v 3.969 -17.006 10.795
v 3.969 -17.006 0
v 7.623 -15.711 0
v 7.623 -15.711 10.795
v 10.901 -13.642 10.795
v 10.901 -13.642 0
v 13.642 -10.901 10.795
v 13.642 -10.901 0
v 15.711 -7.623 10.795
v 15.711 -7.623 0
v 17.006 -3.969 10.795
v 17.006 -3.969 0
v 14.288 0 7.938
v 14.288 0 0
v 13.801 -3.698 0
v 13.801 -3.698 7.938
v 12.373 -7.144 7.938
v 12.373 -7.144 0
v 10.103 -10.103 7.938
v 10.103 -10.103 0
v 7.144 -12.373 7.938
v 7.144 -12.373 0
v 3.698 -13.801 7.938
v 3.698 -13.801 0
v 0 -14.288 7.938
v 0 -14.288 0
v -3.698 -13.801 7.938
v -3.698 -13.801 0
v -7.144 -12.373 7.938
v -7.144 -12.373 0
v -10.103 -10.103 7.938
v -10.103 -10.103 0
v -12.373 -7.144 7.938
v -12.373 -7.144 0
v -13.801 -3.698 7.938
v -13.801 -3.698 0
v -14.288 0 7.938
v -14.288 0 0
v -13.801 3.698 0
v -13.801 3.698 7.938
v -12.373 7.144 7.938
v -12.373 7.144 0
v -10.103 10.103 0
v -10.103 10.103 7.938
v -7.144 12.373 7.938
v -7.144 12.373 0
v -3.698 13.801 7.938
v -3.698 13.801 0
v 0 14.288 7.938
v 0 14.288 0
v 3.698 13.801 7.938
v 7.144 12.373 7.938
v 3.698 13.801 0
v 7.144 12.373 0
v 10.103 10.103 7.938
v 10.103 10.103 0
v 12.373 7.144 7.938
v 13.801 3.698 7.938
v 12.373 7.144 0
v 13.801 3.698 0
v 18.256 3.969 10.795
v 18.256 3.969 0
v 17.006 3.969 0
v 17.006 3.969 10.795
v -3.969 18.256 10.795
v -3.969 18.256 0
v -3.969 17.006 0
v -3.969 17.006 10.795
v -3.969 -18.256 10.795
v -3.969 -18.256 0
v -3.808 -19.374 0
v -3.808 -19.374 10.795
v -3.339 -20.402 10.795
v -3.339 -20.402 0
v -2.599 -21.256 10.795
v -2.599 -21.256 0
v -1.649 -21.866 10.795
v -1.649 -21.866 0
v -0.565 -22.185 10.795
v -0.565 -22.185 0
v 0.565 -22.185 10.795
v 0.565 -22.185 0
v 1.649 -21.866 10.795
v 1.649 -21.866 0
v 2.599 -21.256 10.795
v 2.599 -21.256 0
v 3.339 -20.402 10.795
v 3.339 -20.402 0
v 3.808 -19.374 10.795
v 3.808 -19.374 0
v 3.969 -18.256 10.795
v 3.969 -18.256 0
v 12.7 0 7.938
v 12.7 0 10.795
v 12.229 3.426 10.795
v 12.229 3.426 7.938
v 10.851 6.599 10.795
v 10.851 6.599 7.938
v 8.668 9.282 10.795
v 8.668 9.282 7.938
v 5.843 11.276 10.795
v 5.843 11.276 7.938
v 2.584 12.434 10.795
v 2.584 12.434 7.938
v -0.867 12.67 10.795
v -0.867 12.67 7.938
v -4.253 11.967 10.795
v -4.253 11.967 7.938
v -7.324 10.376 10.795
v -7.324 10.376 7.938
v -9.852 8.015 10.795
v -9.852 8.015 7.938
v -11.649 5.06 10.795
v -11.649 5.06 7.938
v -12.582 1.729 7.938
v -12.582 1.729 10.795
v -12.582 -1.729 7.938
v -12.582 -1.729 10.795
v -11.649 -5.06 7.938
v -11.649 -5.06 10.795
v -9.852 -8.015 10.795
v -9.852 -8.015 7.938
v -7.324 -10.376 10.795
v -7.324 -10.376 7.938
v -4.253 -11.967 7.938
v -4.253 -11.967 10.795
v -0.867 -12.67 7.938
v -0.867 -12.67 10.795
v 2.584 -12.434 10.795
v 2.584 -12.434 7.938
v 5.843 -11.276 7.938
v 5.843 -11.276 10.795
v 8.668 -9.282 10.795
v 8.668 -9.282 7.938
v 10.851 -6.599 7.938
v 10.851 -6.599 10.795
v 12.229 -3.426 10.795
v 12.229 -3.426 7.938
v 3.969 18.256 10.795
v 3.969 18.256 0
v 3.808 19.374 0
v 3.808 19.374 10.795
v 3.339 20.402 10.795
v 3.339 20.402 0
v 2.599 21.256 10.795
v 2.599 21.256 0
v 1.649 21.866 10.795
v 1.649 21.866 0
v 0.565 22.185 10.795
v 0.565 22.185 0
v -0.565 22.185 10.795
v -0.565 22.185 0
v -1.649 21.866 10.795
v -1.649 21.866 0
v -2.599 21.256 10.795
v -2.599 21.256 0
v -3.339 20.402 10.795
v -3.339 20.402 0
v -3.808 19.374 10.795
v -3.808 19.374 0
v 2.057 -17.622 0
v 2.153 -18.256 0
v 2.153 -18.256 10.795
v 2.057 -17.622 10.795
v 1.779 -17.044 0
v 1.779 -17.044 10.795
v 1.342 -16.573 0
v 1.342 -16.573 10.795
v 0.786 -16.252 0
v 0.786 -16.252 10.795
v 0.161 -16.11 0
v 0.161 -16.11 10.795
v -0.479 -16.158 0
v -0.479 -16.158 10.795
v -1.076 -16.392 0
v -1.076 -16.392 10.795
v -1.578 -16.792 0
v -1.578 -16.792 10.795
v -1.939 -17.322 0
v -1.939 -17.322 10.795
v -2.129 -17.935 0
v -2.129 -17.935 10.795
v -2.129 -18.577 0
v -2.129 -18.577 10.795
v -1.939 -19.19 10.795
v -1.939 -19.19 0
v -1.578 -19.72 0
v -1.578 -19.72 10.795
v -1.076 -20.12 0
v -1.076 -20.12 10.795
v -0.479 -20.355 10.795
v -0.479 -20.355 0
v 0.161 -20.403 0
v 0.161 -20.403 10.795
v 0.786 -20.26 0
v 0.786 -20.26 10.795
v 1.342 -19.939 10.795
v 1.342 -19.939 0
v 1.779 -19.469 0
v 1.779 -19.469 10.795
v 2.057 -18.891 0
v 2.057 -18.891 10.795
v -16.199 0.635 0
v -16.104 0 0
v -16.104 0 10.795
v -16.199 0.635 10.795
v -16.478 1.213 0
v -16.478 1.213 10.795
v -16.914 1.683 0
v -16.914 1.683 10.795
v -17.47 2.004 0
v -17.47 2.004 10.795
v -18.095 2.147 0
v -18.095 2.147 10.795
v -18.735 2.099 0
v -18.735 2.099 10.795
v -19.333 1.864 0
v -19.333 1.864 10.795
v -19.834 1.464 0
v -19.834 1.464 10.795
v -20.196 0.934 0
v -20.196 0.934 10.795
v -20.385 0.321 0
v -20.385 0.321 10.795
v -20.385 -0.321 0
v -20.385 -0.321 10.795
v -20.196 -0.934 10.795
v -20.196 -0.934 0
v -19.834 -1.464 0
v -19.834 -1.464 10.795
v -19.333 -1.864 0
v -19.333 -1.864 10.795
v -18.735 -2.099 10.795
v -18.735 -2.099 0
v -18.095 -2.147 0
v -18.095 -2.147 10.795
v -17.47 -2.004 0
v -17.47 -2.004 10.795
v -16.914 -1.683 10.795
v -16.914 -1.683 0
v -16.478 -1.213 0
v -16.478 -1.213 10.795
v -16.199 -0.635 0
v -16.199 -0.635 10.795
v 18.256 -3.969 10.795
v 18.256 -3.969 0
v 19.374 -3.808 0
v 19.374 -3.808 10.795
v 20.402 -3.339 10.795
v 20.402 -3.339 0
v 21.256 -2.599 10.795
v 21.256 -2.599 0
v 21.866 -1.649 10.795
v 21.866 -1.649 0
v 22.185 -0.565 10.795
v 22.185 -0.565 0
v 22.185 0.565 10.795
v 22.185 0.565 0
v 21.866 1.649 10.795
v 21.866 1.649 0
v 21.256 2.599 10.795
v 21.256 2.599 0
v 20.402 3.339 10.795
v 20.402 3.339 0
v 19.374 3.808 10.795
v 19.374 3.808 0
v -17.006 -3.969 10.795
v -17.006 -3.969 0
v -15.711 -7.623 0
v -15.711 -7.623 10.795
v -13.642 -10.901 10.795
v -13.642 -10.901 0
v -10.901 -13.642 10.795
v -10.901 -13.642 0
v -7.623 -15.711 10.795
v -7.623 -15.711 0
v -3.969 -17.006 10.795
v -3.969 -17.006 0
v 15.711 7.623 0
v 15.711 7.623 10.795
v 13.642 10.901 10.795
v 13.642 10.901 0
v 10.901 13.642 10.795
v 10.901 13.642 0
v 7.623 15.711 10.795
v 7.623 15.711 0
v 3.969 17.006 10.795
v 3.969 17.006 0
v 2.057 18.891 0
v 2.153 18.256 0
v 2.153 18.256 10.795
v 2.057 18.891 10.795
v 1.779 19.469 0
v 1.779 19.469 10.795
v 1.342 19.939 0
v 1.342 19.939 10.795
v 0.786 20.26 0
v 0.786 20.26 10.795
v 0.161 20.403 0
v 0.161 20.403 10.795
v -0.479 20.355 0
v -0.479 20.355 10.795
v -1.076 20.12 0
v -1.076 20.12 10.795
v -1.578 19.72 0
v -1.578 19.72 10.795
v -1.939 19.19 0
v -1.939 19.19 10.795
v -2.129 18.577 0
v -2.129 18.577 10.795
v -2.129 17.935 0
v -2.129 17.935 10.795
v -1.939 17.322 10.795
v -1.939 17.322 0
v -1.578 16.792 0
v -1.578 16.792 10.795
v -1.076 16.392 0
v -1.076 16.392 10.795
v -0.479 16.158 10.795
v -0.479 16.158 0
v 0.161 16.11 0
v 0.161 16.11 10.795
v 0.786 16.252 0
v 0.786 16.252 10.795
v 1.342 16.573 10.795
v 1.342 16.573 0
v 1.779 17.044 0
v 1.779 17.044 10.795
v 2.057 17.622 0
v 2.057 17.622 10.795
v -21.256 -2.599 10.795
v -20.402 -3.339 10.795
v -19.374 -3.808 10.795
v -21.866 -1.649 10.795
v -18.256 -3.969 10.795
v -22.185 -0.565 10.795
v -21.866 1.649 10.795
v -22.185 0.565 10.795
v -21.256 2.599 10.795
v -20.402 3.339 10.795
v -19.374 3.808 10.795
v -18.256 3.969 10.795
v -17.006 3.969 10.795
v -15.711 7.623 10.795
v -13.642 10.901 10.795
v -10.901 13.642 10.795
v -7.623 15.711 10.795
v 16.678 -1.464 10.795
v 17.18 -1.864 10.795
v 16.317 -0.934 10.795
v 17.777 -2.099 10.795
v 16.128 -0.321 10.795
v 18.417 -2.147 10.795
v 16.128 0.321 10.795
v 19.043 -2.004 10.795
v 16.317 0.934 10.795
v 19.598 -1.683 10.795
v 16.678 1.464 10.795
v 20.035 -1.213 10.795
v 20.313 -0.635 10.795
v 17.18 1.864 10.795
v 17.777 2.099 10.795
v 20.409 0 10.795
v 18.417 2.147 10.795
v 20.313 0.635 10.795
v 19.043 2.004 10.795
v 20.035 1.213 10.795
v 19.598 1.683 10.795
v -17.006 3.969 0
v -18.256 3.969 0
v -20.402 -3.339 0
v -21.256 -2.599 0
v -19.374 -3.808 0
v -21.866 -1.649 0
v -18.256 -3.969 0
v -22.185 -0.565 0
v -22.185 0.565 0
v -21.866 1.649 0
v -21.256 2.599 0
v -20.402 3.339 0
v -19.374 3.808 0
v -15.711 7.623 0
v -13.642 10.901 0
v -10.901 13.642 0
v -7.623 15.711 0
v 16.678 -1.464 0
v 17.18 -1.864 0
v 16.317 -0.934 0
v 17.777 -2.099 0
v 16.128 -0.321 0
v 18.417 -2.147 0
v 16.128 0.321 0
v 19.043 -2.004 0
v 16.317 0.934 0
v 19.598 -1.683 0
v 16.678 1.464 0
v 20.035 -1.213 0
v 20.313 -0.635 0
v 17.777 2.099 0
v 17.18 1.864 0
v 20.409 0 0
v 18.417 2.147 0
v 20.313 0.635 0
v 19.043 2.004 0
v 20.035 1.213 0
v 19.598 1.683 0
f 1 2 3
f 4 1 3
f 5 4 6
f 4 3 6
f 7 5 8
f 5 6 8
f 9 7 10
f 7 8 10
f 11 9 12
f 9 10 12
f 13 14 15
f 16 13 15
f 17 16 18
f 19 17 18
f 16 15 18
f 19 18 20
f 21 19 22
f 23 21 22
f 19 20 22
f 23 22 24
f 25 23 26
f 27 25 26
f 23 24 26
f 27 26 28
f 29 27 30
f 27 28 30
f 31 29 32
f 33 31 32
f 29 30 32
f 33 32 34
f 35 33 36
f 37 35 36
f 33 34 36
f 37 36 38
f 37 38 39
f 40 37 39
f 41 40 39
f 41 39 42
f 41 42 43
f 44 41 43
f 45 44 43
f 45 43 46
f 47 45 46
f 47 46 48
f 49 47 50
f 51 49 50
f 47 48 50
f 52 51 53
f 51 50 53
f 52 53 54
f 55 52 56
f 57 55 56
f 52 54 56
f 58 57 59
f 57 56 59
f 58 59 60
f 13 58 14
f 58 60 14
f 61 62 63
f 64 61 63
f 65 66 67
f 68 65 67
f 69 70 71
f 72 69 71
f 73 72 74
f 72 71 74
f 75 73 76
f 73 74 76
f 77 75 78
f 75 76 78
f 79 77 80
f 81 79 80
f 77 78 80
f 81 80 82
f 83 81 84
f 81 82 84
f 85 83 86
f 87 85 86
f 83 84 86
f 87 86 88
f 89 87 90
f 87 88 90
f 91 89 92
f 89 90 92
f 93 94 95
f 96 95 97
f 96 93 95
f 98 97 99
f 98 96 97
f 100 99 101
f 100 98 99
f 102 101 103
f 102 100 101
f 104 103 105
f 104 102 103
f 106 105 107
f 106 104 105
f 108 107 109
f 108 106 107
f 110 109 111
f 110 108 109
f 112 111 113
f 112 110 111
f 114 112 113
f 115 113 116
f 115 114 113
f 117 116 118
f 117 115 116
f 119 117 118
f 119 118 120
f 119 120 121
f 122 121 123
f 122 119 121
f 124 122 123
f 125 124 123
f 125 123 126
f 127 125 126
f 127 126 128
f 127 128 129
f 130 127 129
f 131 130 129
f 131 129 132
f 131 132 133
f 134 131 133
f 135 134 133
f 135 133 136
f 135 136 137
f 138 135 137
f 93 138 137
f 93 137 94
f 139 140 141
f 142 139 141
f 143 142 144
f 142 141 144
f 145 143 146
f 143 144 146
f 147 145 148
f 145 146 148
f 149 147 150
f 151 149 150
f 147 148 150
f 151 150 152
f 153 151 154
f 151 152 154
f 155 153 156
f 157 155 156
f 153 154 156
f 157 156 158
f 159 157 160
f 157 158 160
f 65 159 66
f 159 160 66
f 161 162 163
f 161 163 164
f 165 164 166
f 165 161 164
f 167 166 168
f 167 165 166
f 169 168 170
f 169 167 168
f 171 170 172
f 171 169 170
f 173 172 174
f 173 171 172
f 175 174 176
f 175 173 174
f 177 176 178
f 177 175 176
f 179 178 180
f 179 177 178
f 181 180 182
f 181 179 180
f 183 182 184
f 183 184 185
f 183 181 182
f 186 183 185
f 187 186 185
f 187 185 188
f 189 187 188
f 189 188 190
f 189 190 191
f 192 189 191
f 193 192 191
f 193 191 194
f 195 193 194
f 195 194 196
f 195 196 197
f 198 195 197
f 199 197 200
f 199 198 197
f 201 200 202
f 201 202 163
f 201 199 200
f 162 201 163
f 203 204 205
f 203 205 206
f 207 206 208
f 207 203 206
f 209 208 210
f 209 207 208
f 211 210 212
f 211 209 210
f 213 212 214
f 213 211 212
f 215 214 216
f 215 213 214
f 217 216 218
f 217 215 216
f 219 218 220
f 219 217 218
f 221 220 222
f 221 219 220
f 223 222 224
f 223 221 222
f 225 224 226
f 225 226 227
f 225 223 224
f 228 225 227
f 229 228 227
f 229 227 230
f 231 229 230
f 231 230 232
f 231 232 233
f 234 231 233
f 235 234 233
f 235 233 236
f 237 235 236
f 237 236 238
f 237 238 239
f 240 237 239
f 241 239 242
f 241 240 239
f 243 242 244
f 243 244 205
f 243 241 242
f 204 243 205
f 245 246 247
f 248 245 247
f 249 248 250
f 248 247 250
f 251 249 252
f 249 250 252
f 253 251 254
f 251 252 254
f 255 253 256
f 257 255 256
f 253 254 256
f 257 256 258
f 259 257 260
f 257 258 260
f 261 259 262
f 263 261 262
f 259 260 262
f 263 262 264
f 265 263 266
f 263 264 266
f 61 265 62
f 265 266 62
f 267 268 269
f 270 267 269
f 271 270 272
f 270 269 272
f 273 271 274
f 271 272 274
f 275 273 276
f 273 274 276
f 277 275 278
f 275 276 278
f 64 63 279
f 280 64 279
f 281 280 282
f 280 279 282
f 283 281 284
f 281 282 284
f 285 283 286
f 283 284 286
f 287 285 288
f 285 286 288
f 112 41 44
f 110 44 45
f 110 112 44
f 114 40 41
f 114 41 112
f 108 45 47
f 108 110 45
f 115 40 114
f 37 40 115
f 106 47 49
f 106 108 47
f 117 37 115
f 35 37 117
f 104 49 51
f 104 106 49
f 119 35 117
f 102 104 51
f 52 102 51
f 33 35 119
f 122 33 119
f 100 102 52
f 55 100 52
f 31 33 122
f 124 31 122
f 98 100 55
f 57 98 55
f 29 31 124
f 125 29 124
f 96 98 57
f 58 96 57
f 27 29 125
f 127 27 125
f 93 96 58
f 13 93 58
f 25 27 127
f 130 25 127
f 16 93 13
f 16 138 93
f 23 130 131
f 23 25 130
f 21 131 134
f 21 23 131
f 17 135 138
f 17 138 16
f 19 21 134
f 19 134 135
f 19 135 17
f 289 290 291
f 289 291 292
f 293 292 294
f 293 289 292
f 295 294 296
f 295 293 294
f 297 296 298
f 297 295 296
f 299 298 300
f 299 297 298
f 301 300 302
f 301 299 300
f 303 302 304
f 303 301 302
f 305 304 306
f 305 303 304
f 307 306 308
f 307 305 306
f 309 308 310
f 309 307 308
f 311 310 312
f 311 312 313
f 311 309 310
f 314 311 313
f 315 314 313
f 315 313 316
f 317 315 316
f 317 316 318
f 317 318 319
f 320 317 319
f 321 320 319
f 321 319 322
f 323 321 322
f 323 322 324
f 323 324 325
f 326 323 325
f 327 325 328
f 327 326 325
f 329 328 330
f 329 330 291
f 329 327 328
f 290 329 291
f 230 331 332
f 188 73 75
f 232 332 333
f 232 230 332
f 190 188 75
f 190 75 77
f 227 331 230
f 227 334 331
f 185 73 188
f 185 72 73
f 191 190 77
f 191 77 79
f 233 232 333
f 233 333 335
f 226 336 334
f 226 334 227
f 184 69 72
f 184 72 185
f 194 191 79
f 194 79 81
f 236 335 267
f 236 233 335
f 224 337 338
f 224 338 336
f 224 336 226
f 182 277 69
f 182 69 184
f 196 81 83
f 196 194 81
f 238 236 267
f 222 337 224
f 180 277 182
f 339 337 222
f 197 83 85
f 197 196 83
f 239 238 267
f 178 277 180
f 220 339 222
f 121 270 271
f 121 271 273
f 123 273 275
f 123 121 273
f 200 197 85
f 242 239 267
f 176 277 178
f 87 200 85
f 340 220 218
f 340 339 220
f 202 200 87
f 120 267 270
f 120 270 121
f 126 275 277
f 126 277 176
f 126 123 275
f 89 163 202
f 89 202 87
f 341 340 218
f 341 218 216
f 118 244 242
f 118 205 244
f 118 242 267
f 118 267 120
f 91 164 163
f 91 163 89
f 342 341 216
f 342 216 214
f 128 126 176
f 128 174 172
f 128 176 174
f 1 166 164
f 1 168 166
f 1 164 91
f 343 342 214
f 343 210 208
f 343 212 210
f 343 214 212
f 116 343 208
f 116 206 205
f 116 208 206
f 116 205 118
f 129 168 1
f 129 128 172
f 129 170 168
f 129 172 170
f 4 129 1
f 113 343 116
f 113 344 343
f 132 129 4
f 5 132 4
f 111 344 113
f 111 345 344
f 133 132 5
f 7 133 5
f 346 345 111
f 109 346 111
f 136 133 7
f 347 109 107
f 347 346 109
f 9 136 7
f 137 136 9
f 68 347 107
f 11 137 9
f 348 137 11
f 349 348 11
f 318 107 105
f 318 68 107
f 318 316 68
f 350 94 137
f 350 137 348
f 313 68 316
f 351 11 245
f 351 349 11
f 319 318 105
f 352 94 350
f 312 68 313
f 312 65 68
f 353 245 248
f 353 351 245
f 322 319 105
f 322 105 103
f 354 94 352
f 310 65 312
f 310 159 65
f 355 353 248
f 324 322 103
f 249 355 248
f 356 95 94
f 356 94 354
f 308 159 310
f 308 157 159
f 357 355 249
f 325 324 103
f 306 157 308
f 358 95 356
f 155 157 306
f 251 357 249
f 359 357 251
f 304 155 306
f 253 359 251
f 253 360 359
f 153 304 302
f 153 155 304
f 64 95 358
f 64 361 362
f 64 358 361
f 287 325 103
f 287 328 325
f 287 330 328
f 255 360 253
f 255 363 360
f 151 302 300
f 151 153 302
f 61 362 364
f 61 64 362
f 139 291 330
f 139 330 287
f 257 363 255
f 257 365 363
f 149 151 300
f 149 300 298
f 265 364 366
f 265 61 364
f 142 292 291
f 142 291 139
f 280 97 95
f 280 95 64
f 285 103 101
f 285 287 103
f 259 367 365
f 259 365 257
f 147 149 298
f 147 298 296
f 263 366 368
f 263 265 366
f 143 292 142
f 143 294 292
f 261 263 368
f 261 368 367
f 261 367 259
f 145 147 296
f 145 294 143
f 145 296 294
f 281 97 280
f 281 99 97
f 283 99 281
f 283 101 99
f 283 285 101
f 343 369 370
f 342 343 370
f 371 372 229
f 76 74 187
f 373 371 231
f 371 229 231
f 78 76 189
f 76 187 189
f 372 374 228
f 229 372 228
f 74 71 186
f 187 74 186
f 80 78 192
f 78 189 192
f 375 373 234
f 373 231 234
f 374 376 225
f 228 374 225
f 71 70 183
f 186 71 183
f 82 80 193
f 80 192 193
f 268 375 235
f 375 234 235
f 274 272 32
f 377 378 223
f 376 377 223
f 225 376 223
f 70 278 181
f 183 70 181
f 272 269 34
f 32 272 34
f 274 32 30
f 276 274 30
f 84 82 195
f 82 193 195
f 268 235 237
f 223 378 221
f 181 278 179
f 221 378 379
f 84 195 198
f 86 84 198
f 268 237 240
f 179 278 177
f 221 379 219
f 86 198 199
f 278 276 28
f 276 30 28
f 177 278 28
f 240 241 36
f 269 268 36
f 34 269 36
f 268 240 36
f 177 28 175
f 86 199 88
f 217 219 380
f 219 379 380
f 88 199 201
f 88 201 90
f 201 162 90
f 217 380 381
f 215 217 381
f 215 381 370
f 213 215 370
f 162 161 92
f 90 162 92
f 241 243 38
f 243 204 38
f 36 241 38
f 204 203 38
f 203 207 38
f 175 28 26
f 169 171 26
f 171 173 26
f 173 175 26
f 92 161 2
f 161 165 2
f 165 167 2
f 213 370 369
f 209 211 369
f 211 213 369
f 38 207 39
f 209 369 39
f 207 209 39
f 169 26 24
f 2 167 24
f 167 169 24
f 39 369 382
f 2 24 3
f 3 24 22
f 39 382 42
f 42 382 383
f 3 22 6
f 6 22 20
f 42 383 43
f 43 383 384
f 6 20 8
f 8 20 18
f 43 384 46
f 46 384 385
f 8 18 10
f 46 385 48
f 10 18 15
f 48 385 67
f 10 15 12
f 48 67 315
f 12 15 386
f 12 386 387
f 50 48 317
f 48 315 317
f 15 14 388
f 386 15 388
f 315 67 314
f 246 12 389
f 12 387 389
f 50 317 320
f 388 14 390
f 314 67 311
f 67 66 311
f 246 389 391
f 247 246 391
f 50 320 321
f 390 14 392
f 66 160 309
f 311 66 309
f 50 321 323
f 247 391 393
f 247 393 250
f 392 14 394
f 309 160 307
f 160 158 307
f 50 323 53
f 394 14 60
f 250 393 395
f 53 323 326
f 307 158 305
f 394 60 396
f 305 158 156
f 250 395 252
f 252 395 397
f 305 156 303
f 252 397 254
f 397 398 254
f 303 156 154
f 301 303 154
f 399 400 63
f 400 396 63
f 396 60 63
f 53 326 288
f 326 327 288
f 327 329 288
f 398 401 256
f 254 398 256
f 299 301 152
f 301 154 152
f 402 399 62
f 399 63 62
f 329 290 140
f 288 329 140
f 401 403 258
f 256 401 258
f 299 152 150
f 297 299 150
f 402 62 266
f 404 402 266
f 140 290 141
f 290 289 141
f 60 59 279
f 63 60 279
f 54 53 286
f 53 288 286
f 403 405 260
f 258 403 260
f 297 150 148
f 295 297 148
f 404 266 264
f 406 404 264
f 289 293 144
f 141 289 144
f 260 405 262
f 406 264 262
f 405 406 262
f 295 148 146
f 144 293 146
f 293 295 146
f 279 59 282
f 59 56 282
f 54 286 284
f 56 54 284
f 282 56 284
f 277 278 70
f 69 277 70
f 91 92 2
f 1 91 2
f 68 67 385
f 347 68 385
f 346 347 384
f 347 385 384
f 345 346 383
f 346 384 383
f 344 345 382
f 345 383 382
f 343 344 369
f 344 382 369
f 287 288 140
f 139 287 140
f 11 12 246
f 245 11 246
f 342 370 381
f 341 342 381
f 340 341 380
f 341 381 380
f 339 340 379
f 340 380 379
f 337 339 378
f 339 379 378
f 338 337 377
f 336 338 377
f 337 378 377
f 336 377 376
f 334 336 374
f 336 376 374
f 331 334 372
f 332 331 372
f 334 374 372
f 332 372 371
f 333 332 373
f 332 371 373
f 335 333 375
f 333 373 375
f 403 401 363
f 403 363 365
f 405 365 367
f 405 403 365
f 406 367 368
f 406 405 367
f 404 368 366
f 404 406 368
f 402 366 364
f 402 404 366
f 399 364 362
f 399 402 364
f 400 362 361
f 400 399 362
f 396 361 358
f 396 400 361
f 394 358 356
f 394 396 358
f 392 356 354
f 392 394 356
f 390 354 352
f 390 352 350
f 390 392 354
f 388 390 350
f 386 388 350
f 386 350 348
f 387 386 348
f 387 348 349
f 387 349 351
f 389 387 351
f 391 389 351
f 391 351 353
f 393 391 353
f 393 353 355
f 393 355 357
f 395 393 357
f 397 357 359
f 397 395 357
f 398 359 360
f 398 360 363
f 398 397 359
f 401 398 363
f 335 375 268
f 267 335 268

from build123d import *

# Parameters (mm, degrees)
F0_R     = 2.15265
F0_R_2   = 12.7
F1_DEPTH = 10.795
F2_R     = 14.2875
F3_DEPTH = 7.9375


with BuildPart() as f1:
    # F0 (on Top) → F1 (new body)
    with BuildSketch(Plane.XY):
        with BuildLine():
            Line((-17.005526, 3.96875), (-18.25625, 3.96875))
            ThreePointArc((-18.25625, 3.96875), (-22.225, 0), (-18.25625, -3.96875))
            Line((-18.25625, -3.96875), (-17.005526, -3.96875))
            ThreePointArc((-17.005526, -3.96875), (-12.347852, -12.347852), (-3.96875, -17.005526))
            Line((-3.96875, -17.005526), (-3.96875, -18.25625))
            ThreePointArc((-3.96875, -18.25625), (0, -22.225), (3.96875, -18.25625))
            Line((3.96875, -18.25625), (3.96875, -17.005526))
            ThreePointArc((3.96875, -17.005526), (12.347852, -12.347852), (17.005526, -3.96875))
            Line((17.005526, -3.96875), (18.25625, -3.96875))
            ThreePointArc((18.25625, -3.96875), (22.225, 0), (18.25625, 3.96875))
            Line((18.25625, 3.96875), (17.005526, 3.96875))
            ThreePointArc((17.005526, 3.96875), (12.347852, 12.347852), (3.96875, 17.005526))
            Line((3.96875, 17.005526), (3.96875, 18.25625))
            ThreePointArc((3.96875, 18.25625), (0, 22.225), (-3.96875, 18.25625))
            Line((-3.96875, 18.25625), (-3.96875, 17.005526))
            ThreePointArc((-3.96875, 17.005526), (-12.347852, 12.347852), (-17.005526, 3.96875))
        make_face()
        with Locations((0, -18.25625)):
            Circle(F0_R, mode=Mode.SUBTRACT)
        with Locations((-18.25625, 0)):
            Circle(F0_R, mode=Mode.SUBTRACT)
        Circle(F0_R_2, mode=Mode.SUBTRACT)
        with Locations((18.25625, 0)):
            Circle(F0_R, mode=Mode.SUBTRACT)
        with Locations((0, 18.25625)):
            Circle(F0_R, mode=Mode.SUBTRACT)
    extrude(amount=F1_DEPTH)

    # F2 (on face) → F3 (cut)
    with BuildSketch(Plane(origin=(0, 0, 0), x_dir=(1, 0, 0), z_dir=(0, 0, -1))):
        Circle(F2_R)
    extrude(amount=-F3_DEPTH, mode=Mode.SUBTRACT)


solid = f1.part
